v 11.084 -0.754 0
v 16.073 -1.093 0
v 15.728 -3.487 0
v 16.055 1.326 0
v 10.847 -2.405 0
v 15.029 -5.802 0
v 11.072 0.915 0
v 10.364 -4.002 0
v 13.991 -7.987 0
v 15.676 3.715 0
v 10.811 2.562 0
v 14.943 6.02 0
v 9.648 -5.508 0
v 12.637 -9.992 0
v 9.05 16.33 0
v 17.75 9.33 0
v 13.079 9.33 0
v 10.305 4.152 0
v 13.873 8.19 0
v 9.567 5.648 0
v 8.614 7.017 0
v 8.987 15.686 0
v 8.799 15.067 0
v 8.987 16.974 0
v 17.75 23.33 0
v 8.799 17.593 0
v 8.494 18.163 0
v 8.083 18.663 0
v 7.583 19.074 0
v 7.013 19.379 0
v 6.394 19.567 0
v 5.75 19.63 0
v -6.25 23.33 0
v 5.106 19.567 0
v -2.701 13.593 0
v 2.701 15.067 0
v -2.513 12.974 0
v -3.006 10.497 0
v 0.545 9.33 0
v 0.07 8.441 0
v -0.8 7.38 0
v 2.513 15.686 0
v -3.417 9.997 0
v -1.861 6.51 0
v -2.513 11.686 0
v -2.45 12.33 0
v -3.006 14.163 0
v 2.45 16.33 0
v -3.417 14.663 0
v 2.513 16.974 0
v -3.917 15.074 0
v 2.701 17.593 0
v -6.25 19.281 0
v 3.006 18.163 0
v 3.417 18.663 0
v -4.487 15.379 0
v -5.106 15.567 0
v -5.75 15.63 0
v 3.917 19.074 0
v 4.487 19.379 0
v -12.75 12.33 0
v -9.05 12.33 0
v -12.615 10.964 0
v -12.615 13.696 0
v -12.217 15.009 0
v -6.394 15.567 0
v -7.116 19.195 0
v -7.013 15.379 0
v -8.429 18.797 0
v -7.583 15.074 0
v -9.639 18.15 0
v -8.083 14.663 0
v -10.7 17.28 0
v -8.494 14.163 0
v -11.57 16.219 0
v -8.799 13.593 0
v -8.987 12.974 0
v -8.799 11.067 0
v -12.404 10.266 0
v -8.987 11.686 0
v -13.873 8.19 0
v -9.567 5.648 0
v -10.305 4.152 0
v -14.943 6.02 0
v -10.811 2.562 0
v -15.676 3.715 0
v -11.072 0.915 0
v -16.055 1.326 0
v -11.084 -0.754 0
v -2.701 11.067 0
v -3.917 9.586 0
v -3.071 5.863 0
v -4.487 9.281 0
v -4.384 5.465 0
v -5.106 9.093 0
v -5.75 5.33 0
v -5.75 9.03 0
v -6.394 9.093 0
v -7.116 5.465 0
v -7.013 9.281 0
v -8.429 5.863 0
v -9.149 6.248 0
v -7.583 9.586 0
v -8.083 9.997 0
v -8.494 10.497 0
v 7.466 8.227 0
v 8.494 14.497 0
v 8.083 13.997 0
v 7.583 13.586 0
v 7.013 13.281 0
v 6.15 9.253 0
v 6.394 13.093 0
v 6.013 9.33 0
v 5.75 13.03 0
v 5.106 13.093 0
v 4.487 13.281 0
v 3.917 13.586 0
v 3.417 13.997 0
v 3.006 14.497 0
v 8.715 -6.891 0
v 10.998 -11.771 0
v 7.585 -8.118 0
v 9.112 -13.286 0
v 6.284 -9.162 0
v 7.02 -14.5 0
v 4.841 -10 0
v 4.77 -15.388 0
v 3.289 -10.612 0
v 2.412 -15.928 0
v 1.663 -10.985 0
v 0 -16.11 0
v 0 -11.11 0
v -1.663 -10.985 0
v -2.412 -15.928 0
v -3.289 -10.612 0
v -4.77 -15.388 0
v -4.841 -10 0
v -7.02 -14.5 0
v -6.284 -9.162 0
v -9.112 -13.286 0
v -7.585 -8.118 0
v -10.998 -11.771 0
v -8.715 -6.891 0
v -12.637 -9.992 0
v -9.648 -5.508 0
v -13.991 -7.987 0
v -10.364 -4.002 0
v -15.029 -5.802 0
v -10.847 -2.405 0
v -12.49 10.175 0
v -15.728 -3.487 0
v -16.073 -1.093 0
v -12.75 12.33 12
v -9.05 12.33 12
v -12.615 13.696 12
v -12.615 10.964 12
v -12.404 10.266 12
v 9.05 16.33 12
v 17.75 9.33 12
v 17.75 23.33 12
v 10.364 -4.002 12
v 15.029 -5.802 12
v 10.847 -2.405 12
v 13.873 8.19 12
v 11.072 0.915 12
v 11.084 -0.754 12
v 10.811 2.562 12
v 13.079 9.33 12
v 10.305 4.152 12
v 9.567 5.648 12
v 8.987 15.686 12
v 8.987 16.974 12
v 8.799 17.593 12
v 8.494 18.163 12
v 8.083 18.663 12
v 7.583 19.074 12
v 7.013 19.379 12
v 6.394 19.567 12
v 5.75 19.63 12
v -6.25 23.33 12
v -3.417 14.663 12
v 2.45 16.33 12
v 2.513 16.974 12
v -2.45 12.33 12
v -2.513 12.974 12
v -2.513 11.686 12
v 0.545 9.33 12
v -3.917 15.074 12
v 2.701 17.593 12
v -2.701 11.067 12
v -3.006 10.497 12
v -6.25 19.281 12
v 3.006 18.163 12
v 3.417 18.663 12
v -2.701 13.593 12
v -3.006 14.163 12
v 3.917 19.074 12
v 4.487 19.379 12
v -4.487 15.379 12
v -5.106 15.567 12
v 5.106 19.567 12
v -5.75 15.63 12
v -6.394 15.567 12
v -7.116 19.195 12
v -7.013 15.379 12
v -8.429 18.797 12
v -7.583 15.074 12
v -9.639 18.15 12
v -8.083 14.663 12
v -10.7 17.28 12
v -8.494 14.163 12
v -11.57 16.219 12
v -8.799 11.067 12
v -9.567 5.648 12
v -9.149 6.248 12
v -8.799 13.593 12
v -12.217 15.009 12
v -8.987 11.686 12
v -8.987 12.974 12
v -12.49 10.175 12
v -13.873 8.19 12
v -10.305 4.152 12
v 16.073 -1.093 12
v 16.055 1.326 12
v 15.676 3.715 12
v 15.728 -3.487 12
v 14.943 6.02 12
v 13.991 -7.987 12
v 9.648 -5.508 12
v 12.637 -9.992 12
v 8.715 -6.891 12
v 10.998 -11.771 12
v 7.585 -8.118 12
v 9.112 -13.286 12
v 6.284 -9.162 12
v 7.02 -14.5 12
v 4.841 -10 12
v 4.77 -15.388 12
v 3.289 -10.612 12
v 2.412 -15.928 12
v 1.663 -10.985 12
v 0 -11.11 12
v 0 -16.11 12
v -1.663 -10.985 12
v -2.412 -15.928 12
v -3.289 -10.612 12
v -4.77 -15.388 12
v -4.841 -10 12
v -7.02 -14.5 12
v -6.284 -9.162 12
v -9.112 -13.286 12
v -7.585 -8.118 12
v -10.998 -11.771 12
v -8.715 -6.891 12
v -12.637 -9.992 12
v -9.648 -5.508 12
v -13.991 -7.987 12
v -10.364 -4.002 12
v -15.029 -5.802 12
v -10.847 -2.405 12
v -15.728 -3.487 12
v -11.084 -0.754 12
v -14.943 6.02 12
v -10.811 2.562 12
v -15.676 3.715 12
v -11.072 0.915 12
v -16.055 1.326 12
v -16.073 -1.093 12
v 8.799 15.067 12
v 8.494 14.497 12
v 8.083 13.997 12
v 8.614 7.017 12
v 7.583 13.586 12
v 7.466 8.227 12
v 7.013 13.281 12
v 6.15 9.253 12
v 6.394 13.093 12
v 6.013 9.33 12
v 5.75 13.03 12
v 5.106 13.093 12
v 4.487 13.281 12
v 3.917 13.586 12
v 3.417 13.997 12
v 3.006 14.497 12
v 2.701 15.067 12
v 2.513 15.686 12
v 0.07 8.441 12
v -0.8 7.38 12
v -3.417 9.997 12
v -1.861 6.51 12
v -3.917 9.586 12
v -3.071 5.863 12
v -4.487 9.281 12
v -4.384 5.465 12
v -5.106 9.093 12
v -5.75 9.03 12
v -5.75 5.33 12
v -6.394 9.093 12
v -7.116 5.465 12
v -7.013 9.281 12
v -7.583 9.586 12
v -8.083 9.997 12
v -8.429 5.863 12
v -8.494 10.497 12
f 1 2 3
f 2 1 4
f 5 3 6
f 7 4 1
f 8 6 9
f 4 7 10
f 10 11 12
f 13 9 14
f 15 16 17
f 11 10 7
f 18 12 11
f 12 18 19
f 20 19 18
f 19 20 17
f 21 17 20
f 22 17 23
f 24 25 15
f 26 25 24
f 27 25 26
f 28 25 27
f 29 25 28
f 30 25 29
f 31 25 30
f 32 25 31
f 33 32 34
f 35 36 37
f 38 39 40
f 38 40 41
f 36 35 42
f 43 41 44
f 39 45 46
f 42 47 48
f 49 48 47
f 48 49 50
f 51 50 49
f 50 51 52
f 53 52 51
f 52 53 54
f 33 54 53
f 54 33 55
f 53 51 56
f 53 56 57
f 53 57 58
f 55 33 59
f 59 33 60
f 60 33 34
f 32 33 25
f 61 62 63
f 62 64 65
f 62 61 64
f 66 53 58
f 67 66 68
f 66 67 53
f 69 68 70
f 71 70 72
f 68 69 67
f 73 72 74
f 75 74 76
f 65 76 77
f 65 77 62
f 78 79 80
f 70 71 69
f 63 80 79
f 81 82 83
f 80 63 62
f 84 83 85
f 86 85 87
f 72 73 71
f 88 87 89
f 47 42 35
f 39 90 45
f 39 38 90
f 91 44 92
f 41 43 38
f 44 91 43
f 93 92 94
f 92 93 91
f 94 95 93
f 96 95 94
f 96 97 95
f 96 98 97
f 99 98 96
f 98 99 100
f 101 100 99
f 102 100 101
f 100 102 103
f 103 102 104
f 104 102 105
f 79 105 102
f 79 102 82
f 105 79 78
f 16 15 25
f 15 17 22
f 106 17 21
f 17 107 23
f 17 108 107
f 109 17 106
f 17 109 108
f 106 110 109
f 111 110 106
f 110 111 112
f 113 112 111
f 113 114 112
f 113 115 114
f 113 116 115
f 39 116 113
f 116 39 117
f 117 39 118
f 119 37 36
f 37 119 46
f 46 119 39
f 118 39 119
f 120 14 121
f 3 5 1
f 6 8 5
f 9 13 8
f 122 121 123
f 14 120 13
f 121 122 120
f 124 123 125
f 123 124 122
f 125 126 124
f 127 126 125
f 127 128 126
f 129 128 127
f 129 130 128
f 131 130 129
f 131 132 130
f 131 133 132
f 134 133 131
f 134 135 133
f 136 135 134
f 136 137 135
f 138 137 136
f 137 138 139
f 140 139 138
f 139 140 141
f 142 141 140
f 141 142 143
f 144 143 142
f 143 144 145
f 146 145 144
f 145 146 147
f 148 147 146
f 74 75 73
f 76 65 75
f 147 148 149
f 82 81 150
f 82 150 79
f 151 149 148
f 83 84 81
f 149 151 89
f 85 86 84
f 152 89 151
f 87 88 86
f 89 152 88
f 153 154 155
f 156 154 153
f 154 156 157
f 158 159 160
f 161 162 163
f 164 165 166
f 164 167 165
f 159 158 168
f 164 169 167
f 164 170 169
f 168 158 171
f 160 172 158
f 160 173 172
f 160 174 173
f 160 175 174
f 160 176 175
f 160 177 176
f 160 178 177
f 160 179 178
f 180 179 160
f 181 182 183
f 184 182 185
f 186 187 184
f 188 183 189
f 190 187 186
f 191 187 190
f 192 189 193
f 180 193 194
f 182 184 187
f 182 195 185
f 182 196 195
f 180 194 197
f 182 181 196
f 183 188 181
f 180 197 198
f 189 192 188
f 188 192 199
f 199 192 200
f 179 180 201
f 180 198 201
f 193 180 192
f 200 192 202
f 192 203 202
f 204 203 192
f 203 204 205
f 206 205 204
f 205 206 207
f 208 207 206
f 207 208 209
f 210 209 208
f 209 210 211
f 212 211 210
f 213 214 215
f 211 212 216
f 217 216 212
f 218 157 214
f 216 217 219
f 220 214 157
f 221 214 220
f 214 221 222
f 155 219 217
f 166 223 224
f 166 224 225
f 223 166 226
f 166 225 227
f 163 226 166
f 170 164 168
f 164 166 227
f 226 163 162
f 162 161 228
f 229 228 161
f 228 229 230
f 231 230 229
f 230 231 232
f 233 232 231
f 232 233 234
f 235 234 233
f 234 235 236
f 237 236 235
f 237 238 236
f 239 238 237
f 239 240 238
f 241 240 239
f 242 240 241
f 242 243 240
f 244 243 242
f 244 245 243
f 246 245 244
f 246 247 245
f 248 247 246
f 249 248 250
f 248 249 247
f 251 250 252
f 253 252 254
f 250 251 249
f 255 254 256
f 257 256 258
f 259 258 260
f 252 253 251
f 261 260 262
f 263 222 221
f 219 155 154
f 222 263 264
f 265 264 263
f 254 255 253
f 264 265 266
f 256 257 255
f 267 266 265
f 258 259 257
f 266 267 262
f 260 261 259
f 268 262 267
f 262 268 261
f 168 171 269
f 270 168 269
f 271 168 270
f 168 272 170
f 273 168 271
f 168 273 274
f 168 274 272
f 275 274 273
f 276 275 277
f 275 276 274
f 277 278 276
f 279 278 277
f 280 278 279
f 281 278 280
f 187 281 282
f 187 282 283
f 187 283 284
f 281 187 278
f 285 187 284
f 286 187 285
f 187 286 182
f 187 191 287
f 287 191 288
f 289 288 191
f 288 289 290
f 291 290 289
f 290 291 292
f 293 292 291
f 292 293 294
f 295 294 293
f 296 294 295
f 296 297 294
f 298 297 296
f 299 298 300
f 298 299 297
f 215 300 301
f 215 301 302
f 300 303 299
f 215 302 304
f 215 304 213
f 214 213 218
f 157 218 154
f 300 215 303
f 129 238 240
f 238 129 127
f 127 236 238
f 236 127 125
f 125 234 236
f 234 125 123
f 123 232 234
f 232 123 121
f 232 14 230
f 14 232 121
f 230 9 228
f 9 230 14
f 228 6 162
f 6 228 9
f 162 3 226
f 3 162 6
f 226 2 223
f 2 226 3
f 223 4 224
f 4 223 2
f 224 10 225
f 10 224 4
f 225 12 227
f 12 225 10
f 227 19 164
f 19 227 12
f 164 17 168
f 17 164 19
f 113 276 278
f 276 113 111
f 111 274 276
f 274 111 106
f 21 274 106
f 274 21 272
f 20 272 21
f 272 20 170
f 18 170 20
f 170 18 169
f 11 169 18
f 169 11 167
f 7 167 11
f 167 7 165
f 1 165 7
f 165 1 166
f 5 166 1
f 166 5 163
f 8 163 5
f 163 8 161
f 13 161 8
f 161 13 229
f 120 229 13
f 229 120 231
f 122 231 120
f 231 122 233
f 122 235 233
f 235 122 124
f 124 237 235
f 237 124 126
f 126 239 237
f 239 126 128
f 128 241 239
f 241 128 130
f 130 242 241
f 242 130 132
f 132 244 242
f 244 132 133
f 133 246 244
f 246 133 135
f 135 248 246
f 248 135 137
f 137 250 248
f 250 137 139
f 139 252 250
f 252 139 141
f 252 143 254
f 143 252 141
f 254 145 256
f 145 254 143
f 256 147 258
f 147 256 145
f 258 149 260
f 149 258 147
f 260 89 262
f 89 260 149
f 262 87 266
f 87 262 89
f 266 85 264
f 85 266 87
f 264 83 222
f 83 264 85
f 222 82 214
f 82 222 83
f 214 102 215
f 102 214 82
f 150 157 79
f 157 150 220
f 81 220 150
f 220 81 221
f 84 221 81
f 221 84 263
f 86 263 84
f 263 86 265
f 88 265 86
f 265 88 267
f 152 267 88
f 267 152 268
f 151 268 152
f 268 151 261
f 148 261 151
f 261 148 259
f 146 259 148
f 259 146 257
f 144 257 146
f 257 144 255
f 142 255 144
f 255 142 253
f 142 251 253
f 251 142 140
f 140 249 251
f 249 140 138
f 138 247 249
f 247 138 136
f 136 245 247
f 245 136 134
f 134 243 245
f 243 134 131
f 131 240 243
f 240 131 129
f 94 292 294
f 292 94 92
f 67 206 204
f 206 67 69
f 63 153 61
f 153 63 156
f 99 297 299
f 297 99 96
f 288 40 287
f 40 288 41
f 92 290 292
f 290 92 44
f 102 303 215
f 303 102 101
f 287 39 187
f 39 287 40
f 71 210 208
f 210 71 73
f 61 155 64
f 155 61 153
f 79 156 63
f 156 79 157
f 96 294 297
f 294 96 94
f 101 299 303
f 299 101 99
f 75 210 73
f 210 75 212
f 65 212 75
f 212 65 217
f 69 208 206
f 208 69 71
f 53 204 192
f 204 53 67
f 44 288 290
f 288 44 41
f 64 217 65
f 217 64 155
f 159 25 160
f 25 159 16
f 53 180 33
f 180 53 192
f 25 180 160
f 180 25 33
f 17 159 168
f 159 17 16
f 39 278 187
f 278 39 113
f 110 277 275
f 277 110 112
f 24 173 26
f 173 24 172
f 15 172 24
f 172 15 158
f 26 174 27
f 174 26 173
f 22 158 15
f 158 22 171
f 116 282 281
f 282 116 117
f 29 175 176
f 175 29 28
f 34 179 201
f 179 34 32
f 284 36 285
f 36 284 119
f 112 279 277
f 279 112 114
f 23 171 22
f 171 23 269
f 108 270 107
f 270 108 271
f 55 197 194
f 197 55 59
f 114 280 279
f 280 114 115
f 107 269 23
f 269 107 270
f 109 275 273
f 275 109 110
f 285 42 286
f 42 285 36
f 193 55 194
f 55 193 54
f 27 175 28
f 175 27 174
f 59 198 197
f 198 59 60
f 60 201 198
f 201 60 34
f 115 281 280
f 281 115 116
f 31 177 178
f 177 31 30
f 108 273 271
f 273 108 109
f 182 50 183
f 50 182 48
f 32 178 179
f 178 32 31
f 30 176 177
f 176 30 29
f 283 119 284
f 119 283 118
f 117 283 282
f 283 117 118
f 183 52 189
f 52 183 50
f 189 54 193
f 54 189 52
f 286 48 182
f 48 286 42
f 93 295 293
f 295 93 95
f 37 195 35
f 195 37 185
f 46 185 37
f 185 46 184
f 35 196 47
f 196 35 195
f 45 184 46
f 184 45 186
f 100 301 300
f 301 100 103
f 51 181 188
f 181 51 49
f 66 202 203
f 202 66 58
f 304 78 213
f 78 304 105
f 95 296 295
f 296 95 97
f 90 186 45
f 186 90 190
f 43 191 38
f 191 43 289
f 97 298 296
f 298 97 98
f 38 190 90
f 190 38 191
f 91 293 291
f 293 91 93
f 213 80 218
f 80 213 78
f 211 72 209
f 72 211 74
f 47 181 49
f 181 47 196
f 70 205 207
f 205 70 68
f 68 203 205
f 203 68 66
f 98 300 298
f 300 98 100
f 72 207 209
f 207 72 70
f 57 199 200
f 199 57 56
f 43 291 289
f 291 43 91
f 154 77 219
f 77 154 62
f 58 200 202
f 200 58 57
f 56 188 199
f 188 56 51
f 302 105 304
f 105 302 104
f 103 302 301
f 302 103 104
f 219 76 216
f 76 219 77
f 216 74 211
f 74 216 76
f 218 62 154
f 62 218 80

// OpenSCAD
$fn = 32;

// ----------------------------------------------------------------------
// Pipe clamp: 32.22 mm ring, 5 mm wall, 12 mm wide
// ----------------------------------------------------------------------

// --- parameters (mm) ---
outer_r = 16.11;          // clamp outside radius
inner_r = 11.11;          // pipe bore radius
band = 5;                 // band thickness
clamp_w = 12;             // clamp width
opening = 50;             // opening angle between the ends
lug_w = 24;               // lug width
lug_len = 14;             // lug length
bolt_d = 6.6;             // bolt hole
knuckle_d = 14;           // hinge knuckle diameter
pin_d = 6.6;              // hinge pin hole

clamp_profile = [[-6.808, 14.601], [-8.918, 13.417], [-10.826, 11.93], [-12.49, 10.175], [-13.873, 8.19], [-14.943, 6.02], [-15.676, 3.715], [-16.055, 1.326], [-16.073, -1.093], [-15.728, -3.487], [-15.029, -5.802], [-13.991, -7.987], [-12.637, -9.992], [-10.998, -11.771], [-9.112, -13.286], [-7.02, -14.5], [-4.77, -15.388], [-2.412, -15.928], [0, -16.11], [2.412, -15.928], [4.77, -15.388], [7.02, -14.5], [9.112, -13.286], [10.998, -11.771], [12.637, -9.992], [13.991, -7.987], [15.029, -5.802], [15.728, -3.487], [16.073, -1.093], [16.055, 1.326], [15.676, 3.715], [14.943, 6.02], [13.873, 8.19], [12.49, 10.175], [10.826, 11.93], [8.918, 13.417], [6.808, 14.601], [4.695, 10.069], [6.15, 9.253], [7.466, 8.227], [8.614, 7.017], [9.567, 5.648], [10.305, 4.152], [10.811, 2.562], [11.072, 0.915], [11.084, -0.754], [10.847, -2.405], [10.364, -4.002], [9.648, -5.508], [8.715, -6.891], [7.585, -8.118], [6.284, -9.162], [4.841, -10], [3.289, -10.612], [1.663, -10.985], [0, -11.11], [-1.663, -10.985], [-3.289, -10.612], [-4.841, -10], [-6.284, -9.162], [-7.585, -8.118], [-8.715, -6.891], [-9.648, -5.508], [-10.364, -4.002], [-10.847, -2.405], [-11.084, -0.754], [-11.072, 0.915], [-10.811, 2.562], [-10.305, 4.152], [-9.567, 5.648], [-8.614, 7.017], [-7.466, 8.227], [-6.15, 9.253], [-4.695, 10.069]];

difference() {
  union() {
    linear_extrude(height = clamp_w) polygon(clamp_profile);
    /* hinge knuckle, sunk 2 mm into the band end */
    translate([-5.75, 12.33, 0]) cylinder(h = clamp_w, d = knuckle_d);
    /* bolt lug on the other end */
    translate([-6.25, 9.33, 0]) cube([lug_w, 14, clamp_w]);
  }
  translate([5.75, 16.33, -2.5]) cylinder(h = clamp_w + 5, d = bolt_d);
  translate([-5.75, 12.33, -2.5]) cylinder(h = clamp_w + 5, d = pin_d);
}
